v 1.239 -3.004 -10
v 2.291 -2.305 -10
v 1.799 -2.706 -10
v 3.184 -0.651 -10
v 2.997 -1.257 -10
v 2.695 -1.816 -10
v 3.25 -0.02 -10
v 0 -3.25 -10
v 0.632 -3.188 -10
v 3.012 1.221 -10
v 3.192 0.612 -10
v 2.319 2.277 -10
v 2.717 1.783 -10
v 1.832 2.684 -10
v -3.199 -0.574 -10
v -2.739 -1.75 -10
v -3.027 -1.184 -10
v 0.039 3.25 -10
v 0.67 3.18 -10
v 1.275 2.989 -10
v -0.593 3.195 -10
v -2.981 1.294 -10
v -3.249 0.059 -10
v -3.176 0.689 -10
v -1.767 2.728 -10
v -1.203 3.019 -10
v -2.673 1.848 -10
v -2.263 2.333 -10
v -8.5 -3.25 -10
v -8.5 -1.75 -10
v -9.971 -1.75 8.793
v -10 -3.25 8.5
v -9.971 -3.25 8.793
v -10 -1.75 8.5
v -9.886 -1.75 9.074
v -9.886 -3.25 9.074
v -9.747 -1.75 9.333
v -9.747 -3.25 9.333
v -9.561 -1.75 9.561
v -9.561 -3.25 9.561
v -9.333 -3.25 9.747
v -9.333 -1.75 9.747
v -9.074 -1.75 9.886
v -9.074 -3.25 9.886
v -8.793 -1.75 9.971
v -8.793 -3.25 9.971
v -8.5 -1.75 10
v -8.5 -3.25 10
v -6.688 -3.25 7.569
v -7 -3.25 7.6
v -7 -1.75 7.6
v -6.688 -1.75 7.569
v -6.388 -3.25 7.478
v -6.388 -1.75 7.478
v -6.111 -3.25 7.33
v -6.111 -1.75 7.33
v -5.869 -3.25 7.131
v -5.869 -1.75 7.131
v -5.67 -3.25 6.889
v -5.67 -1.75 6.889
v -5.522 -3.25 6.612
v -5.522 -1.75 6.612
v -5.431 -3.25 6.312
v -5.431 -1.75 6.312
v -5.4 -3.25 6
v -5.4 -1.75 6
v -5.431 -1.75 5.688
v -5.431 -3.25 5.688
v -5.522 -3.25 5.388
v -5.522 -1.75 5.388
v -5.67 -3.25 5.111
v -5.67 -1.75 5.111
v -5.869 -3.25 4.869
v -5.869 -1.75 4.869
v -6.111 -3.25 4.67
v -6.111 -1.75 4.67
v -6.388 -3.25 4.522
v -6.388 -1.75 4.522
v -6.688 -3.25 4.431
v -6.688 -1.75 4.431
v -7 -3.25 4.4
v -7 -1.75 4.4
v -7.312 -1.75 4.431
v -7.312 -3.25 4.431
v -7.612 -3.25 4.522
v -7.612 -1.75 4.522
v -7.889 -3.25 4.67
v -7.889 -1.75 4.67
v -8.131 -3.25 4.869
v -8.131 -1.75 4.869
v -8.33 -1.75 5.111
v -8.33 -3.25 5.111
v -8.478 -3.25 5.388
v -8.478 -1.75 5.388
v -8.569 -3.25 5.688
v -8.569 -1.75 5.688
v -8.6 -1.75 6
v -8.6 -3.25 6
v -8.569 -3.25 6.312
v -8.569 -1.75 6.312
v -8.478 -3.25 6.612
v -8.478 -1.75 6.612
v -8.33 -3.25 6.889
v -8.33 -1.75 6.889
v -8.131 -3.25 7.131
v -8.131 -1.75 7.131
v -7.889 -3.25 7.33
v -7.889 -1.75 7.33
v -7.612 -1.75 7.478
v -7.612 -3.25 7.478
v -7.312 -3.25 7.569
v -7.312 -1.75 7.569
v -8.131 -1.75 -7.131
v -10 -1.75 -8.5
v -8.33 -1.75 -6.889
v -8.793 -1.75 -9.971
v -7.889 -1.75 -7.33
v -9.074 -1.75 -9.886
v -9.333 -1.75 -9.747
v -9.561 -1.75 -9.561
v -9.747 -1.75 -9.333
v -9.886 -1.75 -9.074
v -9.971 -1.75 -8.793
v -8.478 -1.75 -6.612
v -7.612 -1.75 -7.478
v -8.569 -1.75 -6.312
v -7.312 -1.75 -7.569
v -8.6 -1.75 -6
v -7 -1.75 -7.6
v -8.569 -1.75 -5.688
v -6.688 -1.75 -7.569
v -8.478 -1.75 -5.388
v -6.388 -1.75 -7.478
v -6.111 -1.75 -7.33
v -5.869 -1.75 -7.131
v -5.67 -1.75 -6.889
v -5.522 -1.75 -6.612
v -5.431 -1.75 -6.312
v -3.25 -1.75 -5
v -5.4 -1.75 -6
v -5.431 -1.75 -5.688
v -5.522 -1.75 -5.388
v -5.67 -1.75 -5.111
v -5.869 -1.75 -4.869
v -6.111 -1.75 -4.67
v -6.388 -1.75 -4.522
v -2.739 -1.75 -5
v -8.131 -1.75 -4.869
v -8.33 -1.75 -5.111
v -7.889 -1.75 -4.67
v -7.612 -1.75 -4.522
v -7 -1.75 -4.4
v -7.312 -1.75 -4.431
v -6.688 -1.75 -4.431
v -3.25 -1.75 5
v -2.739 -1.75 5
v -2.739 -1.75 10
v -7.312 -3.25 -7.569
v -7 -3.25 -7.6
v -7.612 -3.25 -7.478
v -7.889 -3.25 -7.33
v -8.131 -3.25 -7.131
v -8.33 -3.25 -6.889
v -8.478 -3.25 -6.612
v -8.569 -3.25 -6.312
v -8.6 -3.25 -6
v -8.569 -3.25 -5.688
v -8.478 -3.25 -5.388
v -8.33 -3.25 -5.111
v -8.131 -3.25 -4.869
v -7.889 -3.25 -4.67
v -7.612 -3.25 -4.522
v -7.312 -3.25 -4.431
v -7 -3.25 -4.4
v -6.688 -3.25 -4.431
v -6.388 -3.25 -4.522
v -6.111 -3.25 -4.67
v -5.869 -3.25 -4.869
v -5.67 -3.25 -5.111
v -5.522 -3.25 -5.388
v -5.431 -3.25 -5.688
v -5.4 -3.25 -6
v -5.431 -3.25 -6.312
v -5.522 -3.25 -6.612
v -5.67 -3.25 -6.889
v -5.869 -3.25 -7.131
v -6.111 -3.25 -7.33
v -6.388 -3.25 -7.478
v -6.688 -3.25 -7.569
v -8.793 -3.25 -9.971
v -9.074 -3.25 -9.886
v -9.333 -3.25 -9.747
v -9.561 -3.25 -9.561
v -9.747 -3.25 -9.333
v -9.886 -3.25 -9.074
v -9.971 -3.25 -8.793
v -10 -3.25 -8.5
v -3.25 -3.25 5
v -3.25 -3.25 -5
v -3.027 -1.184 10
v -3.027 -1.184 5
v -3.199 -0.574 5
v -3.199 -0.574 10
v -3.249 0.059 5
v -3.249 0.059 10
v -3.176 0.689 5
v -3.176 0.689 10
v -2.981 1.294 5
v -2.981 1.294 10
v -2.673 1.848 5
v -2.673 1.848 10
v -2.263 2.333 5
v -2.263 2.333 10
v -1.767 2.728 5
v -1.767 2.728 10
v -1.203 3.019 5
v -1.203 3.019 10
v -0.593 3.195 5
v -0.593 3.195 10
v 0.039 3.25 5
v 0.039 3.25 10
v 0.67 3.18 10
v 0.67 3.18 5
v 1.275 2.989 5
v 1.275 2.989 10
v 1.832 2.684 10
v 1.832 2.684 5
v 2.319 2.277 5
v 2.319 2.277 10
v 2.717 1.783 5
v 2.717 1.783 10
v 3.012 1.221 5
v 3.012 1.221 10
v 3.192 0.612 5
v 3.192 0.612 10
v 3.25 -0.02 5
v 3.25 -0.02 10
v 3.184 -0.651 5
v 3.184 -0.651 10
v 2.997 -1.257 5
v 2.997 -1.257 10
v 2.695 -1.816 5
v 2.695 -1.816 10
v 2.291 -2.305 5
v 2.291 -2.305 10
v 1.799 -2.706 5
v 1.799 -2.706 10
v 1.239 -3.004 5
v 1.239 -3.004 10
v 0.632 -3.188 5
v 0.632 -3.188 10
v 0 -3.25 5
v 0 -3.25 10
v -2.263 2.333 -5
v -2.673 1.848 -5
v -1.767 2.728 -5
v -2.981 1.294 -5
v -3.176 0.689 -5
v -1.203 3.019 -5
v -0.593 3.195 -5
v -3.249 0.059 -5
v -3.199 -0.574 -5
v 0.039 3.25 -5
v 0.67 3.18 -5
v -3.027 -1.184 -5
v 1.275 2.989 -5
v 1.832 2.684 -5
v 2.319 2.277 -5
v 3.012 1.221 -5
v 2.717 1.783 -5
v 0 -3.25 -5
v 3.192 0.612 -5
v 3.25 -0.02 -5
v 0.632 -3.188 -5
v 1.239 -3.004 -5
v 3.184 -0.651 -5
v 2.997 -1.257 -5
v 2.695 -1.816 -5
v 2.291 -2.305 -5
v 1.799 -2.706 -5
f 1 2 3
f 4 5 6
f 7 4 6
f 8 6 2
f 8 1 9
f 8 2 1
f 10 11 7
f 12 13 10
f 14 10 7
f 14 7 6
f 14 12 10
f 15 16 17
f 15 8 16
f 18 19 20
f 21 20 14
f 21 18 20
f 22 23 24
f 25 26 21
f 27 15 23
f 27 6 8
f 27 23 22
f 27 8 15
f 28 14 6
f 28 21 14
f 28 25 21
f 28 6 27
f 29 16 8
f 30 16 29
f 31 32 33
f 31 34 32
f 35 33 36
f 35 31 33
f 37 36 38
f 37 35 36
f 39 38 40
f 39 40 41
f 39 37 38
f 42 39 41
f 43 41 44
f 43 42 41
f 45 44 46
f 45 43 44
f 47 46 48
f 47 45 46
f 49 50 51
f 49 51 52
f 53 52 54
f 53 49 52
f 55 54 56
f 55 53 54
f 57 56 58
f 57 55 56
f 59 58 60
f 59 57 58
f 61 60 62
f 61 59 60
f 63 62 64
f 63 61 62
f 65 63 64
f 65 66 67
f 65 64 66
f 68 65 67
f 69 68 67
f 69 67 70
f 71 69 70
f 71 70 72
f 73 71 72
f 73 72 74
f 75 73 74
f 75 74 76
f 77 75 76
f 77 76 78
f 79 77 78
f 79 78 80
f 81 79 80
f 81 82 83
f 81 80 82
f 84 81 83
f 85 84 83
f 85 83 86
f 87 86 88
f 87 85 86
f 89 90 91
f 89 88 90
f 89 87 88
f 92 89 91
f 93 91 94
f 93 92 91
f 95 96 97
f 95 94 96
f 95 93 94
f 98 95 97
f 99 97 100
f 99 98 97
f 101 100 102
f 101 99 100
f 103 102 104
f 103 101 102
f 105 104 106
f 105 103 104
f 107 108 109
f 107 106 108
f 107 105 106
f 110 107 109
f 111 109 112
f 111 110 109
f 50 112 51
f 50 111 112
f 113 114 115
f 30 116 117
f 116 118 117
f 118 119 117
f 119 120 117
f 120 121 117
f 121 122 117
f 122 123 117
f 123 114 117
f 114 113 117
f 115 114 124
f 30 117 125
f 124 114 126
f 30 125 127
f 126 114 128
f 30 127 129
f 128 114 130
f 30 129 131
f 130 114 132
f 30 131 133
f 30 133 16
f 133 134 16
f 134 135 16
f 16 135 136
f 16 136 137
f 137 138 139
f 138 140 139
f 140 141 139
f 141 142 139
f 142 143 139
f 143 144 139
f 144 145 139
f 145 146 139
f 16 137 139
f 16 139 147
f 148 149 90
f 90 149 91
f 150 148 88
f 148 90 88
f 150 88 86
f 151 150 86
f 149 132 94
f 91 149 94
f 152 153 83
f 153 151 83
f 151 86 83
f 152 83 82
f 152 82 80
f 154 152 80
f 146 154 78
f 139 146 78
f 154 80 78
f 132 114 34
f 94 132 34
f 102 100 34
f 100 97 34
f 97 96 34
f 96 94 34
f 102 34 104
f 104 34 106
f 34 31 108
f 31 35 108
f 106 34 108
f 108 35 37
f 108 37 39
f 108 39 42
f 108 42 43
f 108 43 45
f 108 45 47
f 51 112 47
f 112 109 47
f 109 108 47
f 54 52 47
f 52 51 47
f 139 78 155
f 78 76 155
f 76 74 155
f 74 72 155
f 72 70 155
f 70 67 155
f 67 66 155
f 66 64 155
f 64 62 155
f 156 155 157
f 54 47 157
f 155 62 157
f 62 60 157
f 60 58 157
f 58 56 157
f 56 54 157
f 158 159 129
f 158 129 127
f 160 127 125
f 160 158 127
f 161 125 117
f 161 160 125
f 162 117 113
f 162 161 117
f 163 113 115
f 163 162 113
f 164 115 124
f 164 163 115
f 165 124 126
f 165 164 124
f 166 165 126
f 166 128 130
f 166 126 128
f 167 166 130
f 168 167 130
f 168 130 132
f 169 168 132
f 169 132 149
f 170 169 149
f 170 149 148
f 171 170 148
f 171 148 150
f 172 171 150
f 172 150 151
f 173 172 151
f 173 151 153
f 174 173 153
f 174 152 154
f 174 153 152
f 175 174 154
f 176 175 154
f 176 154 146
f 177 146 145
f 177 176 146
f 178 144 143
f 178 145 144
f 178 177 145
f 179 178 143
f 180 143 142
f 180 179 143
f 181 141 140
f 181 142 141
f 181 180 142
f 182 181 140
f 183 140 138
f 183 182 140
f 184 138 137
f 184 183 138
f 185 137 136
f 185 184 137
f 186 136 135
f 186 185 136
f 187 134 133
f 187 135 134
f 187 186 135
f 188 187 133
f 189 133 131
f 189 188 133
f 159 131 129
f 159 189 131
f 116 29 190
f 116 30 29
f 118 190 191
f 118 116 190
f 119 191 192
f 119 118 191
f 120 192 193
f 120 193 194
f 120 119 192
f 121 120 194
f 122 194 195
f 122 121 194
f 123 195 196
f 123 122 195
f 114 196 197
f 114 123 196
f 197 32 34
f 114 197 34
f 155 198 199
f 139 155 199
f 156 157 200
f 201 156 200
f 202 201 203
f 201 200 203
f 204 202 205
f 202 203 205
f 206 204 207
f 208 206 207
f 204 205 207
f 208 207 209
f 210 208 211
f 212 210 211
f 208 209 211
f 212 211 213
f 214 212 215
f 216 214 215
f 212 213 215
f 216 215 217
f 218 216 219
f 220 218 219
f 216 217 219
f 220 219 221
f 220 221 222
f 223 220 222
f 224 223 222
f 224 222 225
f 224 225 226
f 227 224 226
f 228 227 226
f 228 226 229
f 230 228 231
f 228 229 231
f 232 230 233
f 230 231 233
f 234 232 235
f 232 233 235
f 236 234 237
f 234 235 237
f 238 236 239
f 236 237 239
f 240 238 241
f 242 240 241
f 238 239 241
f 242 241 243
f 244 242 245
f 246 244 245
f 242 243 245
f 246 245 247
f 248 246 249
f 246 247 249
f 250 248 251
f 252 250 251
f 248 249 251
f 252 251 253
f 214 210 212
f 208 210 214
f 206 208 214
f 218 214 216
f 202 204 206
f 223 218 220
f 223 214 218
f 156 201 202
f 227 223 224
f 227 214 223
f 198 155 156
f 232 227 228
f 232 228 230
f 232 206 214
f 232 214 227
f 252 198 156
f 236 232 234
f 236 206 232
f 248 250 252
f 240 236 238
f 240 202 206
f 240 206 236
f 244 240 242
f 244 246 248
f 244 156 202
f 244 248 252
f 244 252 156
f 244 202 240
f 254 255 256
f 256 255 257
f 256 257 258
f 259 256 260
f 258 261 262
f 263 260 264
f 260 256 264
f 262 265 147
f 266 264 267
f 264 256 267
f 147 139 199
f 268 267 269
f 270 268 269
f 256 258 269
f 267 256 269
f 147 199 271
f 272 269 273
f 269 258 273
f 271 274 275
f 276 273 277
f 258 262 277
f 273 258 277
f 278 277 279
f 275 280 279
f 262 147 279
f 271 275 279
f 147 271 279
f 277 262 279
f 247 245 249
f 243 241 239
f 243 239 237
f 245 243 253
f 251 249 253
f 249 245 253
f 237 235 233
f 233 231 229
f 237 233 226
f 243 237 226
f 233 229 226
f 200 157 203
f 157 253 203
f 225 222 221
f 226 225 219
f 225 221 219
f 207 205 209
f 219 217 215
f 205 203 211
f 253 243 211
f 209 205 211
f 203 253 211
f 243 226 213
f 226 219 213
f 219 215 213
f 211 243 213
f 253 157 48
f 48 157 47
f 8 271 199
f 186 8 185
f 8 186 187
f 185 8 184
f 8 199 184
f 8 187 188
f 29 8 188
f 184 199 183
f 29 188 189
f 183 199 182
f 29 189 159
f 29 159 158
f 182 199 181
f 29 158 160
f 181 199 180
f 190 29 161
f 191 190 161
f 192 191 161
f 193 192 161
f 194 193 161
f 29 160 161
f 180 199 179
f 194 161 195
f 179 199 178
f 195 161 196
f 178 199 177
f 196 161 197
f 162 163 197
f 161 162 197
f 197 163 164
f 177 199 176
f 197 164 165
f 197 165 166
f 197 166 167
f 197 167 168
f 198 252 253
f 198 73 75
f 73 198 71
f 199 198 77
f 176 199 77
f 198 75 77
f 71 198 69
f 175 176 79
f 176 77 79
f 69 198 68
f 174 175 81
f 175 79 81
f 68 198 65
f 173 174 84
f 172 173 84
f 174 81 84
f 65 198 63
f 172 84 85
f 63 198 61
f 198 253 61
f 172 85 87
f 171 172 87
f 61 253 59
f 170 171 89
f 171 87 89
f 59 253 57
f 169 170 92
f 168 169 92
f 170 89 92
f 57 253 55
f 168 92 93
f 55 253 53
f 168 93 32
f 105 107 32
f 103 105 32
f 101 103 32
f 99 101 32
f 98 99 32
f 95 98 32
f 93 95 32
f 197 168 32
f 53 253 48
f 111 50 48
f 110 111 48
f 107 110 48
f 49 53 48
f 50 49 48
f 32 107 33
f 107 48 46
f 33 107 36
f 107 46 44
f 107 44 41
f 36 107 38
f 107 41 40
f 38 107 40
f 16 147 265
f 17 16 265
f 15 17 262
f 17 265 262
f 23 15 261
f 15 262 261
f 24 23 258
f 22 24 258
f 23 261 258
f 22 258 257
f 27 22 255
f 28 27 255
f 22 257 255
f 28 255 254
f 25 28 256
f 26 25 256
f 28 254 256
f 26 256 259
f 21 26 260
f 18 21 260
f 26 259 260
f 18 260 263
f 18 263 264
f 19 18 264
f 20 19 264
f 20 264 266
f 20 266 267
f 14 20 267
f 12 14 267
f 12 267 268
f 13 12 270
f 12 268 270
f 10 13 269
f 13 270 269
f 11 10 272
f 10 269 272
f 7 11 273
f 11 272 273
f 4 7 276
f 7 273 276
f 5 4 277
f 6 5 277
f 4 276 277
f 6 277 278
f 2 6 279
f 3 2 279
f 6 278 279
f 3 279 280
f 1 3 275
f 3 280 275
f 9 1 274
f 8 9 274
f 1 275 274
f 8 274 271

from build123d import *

# Parameters (mm, degrees)
EXTRUDE_1_DEPTH          = 10
CUT_EXTRUDE_1_DEPTH      = 16
CUT_EXTRUDE_1_DEPTH_BACK = 16
SKETCH_2_R               = 1.6
SKETCH_2_W               = 6.5
SKETCH_2_H               = 10
FILLET_1_R               = 1.5


with BuildPart() as part:
    # 草图1 → 凸台-拉伸1 (new, symmetric)
    with BuildSketch(Plane.XY):
        with BuildLine():
            Line((0, -3.25), (-10, -3.25))
            Line((-10, -3.25), (-10, -1.75))
            Line((-10, -1.75), (-2.738612788, -1.75))
            ThreePointArc((-2.738612788, -1.75), (1.5612495, 2.850438563), (0, -3.25))
        make_face()
    extrude(amount=EXTRUDE_1_DEPTH, both=True)

    # 草图2 → 切除-拉伸1 (cut, two sides: drawn at the far end of the back side and taken through both)
    with BuildSketch(Plane(origin=(0, -1.75, 0), x_dir=(1, 0, 0), z_dir=(0, 1, 0)).offset(-CUT_EXTRUDE_1_DEPTH_BACK)):
        with Locations(Location((-7, -6, 0), (0, 0, 270))):
            Circle(SKETCH_2_R)
        with Locations(Location((-7, 6, 0), (0, 0, 90))):
            Circle(SKETCH_2_R)
        Rectangle(SKETCH_2_W, SKETCH_2_H)
    extrude(amount=CUT_EXTRUDE_1_DEPTH + CUT_EXTRUDE_1_DEPTH_BACK, mode=Mode.SUBTRACT)

    # 圆角1
    fillet_1_edges = [part.edges().sort_by_distance(p)[0] for p in [
        (-10, -2.5, 10),
        (-10, -2.5, -10),
    ]]
    fillet(fillet_1_edges, radius=FILLET_1_R)


solid = part.part
